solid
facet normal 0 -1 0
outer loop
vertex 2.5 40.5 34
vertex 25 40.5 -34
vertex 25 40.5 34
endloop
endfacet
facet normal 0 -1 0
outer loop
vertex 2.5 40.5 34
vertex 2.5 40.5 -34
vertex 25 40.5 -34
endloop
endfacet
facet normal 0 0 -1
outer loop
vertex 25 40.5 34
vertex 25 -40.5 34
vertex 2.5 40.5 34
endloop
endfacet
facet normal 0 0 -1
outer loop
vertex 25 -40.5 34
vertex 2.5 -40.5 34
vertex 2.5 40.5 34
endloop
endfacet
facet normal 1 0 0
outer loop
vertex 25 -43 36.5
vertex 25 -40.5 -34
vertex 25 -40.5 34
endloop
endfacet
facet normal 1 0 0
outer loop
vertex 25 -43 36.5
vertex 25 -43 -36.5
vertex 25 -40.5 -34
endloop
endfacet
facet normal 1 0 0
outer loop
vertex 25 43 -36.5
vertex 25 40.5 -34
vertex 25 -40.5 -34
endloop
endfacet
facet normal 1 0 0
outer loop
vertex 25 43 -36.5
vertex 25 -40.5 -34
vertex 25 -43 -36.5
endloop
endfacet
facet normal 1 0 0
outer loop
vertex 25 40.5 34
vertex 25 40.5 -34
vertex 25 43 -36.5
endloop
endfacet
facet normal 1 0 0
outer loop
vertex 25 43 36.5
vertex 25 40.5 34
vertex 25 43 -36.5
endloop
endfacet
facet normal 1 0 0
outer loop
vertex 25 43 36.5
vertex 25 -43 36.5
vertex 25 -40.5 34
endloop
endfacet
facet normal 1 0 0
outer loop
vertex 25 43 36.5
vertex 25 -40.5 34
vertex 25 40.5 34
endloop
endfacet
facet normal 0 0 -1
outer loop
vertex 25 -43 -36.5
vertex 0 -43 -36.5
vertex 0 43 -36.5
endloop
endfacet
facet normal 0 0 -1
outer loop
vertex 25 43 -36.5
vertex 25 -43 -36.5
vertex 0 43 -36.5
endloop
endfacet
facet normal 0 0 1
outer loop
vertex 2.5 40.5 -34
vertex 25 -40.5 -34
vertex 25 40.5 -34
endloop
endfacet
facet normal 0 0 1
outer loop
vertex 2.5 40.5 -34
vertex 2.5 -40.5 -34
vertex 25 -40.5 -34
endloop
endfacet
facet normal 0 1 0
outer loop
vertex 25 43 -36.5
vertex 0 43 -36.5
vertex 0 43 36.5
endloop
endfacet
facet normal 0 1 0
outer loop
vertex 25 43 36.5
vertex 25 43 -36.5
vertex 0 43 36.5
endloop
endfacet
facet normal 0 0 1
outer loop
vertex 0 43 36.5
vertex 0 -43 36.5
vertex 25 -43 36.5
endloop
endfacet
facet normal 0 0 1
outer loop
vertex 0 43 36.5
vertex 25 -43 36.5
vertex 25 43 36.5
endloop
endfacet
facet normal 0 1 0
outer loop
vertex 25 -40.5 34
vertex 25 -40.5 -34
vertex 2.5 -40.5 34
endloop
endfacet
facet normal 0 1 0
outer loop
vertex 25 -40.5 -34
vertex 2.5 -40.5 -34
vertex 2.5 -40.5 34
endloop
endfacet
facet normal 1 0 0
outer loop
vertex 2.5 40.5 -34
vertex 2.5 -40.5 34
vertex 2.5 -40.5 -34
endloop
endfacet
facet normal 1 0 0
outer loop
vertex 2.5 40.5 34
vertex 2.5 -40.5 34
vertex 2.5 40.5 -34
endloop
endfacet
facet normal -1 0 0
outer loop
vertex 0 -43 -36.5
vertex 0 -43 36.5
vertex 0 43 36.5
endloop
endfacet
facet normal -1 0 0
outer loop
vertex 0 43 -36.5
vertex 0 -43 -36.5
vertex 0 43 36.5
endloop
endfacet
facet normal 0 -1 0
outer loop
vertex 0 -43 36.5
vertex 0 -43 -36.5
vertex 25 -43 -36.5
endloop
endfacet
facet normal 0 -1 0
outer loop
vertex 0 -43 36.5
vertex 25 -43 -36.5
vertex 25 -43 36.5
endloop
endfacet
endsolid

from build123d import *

# Parameters (mm, degrees)
F0_W     = 86
F0_H     = 73
F1_DEPTH = 25
F2_T     = -2.5


with BuildPart() as f1:
    # F0 (on Right) → F1 (new body)
    with BuildSketch(Plane.YZ):
        Rectangle(F0_W, F0_H)
    extrude(amount=F1_DEPTH)

    # F2
    f2_openings = [f1.faces().sort_by_distance(p)[0] for p in [
        (25, 0, 0),
    ]]
    offset(amount=F2_T, openings=f2_openings)


solid = f1.part
